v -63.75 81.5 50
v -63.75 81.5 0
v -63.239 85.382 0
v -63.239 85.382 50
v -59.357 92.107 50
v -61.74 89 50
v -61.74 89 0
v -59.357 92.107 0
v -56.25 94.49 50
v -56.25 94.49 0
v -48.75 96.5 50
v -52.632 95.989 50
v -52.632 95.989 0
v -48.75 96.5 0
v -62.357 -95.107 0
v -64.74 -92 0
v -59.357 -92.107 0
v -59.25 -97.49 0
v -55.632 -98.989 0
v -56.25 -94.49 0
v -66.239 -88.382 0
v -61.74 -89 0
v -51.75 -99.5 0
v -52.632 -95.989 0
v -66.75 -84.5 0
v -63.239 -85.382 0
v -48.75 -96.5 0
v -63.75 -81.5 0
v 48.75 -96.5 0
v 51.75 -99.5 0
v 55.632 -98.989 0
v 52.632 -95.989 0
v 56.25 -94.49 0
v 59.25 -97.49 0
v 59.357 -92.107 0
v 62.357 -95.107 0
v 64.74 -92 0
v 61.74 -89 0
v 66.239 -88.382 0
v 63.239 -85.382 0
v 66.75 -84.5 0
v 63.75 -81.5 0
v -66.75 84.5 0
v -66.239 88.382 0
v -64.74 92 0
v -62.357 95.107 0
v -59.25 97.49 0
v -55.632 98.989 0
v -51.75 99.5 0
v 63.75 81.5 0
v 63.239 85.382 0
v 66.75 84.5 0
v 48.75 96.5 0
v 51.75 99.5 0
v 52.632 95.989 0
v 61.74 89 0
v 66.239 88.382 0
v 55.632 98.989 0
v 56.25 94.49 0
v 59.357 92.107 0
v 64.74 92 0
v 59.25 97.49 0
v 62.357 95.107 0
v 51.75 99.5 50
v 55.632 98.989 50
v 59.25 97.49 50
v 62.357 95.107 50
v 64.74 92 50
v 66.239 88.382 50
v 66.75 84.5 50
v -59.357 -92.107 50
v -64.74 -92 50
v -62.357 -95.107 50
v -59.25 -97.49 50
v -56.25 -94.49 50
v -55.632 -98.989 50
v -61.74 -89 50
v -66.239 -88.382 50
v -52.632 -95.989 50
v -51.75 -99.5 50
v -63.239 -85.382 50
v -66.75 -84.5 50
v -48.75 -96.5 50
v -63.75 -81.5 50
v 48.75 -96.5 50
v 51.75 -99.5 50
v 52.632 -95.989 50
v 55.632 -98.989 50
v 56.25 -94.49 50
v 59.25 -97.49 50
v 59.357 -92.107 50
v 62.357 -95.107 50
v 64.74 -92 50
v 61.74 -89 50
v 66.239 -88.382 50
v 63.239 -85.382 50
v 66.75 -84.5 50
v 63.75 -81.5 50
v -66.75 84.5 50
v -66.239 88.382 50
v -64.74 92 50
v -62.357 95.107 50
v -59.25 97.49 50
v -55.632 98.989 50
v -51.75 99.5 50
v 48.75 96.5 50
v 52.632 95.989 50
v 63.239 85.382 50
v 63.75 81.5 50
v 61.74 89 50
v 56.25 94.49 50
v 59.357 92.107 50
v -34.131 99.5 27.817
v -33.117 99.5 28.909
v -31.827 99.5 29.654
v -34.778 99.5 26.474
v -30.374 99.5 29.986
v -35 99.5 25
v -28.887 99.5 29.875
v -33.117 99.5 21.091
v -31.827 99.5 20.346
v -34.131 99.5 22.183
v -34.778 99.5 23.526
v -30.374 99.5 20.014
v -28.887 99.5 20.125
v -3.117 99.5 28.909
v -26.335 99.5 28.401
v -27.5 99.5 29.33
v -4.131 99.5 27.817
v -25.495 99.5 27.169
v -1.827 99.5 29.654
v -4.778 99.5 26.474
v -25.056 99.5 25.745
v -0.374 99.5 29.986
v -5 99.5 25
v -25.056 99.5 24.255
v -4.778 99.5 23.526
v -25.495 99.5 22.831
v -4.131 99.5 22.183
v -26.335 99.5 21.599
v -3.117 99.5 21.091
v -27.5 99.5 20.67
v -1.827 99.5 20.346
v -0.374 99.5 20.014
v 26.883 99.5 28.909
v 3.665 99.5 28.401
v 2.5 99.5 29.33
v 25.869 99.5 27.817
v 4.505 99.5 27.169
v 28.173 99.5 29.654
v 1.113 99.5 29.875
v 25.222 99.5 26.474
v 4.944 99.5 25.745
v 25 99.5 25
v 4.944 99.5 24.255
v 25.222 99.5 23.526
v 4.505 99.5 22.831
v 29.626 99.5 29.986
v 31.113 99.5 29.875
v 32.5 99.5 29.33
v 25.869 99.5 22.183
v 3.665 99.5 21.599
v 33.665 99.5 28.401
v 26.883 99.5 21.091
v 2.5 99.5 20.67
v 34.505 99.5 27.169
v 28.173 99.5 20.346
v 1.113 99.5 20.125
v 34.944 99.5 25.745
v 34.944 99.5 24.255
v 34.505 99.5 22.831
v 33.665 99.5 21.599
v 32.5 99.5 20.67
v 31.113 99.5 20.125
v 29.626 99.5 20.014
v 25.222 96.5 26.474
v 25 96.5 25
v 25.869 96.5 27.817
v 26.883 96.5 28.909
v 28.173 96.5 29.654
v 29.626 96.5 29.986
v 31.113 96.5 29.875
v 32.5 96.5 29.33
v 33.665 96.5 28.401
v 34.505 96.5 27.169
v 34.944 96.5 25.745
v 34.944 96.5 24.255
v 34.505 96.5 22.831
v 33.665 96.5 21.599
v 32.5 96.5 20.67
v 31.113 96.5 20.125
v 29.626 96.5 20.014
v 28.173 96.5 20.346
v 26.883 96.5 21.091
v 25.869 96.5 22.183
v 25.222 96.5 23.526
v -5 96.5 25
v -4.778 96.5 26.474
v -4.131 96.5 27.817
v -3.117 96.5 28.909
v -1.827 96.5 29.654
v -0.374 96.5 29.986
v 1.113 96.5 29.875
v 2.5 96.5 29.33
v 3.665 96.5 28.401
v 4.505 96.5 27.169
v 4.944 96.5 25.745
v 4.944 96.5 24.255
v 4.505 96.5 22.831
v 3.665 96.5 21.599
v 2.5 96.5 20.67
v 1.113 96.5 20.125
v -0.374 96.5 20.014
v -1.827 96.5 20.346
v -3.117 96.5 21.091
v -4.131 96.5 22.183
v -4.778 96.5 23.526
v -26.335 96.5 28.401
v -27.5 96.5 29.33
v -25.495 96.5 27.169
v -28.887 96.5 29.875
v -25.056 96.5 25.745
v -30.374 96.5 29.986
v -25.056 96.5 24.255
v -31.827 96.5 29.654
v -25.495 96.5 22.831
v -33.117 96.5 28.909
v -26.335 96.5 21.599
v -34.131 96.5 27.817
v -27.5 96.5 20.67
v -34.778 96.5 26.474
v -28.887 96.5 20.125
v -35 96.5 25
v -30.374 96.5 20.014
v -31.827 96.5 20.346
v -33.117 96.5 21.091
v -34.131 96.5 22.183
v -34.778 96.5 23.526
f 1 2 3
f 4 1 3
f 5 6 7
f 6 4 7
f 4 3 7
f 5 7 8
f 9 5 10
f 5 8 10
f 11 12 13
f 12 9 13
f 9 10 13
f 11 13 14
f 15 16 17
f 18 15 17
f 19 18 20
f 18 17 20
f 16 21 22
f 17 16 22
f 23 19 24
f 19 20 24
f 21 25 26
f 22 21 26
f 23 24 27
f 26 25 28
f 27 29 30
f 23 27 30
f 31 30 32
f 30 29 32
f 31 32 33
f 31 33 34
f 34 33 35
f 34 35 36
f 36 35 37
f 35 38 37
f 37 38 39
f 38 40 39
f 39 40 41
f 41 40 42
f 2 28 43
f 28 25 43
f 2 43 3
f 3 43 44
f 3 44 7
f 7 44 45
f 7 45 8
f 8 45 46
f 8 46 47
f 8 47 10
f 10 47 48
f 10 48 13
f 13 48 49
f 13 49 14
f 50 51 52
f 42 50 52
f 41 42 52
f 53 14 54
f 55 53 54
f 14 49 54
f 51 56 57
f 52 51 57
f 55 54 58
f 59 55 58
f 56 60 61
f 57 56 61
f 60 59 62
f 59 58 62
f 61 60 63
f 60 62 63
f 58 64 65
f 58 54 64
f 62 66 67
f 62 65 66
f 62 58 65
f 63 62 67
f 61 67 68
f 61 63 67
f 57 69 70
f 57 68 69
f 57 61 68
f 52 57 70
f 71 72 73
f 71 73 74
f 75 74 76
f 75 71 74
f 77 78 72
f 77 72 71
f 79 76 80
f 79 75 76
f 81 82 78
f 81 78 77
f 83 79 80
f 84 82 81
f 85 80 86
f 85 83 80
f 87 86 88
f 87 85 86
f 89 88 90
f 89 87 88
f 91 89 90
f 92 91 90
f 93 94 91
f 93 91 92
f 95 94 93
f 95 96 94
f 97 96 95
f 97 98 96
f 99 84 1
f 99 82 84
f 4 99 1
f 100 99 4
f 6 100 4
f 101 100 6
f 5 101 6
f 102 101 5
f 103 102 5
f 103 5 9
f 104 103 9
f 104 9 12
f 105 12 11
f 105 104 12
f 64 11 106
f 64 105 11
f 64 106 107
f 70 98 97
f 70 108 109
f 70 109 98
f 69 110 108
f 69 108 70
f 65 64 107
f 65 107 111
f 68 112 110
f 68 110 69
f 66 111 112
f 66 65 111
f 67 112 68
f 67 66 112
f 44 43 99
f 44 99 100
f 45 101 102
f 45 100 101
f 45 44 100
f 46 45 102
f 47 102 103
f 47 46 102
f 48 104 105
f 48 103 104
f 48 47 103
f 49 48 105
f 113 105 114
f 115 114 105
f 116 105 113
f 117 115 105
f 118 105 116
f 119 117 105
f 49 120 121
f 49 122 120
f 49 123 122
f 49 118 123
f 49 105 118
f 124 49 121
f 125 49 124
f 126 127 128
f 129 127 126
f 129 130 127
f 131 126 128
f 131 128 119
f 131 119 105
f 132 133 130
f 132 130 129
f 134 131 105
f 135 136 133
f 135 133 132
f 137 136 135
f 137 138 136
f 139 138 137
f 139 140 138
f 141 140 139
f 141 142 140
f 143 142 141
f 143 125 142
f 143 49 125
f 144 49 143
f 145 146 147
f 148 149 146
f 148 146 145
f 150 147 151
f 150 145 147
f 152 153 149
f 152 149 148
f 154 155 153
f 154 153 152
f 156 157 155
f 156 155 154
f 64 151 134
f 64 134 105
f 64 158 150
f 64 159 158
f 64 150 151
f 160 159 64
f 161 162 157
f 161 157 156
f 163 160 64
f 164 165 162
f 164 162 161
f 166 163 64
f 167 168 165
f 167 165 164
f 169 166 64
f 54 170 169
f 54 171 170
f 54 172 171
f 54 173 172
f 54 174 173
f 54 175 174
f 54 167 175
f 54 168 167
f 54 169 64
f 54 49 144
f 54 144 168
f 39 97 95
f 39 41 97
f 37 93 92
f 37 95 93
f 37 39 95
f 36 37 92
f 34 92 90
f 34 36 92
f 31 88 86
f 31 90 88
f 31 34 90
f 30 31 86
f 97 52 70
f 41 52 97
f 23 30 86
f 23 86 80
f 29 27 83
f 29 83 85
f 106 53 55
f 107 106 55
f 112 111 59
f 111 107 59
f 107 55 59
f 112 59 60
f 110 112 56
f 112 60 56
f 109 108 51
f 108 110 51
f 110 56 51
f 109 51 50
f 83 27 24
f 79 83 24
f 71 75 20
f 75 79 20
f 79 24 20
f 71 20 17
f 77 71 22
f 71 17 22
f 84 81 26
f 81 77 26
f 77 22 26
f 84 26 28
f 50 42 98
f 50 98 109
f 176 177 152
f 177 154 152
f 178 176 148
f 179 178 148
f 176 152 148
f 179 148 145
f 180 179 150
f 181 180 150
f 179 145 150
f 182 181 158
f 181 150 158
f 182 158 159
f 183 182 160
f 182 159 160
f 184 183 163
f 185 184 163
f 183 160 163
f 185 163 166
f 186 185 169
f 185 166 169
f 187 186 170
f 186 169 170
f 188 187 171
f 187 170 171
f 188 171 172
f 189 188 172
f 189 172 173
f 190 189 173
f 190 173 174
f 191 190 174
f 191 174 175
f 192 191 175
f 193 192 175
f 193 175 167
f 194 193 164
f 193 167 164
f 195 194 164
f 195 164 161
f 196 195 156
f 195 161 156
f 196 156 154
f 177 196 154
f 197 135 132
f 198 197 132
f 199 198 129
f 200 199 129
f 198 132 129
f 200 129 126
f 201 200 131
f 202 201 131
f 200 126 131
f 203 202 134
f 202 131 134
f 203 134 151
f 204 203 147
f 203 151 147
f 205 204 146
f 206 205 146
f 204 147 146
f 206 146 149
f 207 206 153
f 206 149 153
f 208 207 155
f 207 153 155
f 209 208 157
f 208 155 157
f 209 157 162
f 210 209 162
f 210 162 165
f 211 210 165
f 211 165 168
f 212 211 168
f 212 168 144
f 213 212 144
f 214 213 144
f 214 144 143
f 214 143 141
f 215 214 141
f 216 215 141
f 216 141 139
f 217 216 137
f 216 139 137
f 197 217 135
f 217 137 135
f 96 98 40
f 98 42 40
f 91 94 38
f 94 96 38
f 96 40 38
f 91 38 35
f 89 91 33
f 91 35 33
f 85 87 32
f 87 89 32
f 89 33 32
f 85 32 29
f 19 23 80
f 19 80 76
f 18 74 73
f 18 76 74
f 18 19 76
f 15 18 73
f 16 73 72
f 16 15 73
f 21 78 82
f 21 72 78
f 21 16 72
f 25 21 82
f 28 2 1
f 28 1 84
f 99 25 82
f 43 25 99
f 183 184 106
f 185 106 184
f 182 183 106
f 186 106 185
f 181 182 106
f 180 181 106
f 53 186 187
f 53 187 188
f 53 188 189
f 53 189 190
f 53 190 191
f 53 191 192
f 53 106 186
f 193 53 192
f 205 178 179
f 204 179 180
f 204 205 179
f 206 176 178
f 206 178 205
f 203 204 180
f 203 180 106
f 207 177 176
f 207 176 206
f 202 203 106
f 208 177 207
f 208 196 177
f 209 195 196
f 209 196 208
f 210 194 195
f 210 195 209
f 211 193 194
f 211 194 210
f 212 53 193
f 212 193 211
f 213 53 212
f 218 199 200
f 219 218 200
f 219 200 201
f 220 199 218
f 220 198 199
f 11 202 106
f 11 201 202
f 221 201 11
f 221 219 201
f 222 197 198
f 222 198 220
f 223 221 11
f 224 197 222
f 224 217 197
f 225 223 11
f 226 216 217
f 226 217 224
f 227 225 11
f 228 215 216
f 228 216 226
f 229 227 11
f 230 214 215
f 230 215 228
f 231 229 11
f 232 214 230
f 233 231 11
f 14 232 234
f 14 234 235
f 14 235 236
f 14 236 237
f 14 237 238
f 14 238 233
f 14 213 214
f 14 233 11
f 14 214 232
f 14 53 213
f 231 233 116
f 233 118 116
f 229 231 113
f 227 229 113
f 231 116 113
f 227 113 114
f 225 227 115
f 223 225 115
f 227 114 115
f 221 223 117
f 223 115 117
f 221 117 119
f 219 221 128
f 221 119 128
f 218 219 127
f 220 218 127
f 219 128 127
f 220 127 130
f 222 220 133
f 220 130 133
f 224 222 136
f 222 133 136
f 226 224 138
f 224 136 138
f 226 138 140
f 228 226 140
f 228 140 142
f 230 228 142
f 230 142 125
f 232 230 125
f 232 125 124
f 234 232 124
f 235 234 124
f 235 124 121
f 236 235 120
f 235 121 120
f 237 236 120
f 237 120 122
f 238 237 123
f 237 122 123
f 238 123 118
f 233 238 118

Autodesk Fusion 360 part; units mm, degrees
sketch "Sketch1" plane through (0, 0, 0) normal (0, 0, 1) x (1, 0, 0)
  line L0 (51.75, -99.5) -> (-51.75, -99.5)
  line L1 (-66.75, -84.5) -> (-66.75, 84.5)
  line L2 (-51.75, 99.5) -> (51.75, 99.5)
  line L3 (66.75, 84.5) -> (66.75, -84.5)
  line L4 (66.75, -99.5) -> (-66.75, 99.5) construction
  line L5 (-66.75, -99.5) -> (66.75, 99.5) construction
  line L6 (48.75, 96.5) -> (-48.75, 96.5)
  line L7 (-63.75, 81.5) -> (-63.75, -81.5)
  line L8 (-48.75, -96.5) -> (48.75, -96.5)
  line L9 (63.75, -81.5) -> (63.75, 81.5)
  line L10 (63.75, 96.5) -> (-63.75, -96.5) construction
  line L11 (-63.75, 96.5) -> (63.75, -96.5) construction
  arc A0 (-63.75, -81.5) -> (-48.75, -96.5) centre (-48.75, -81.5) ccw
  arc A1 (-66.75, -84.5) -> (-51.75, -99.5) centre (-51.75, -84.5) ccw
  arc A2 (48.75, -96.5) -> (63.75, -81.5) centre (48.75, -81.5) ccw
  arc A3 (51.75, -99.5) -> (66.75, -84.5) centre (51.75, -84.5) ccw
  arc A4 (63.75, 81.5) -> (48.75, 96.5) centre (48.75, 81.5) ccw
  arc A5 (66.75, 84.5) -> (51.75, 99.5) centre (51.75, 84.5) ccw
  arc A6 (-51.75, 99.5) -> (-66.75, 84.5) centre (-51.75, 84.5) ccw
  arc A7 (-48.75, 96.5) -> (-63.75, 81.5) centre (-48.75, 81.5) ccw
  dimension "d1" = 133.5
  dimension "d2" = 199
  dimension "d3" = 127.5
  dimension "d4" = 193
  dimension "d5" = 15
  dimension "d6" = 15
  dimension "d7" = 15
  dimension "d8" = 15
  dimension "d9" = 15
  dimension "d10" = 15
  dimension "d11" = 15
  dimension "d12" = 15
extrude "Extrude1" add sketch "Sketch1" along normal blind 10
extrude "Extrude2" add 1 faces at (65.75, -27.1667, 10) along direction (0, 0, 1) blind 10
extrude "Extrude3" add 1 faces at (65.75, -27.1667, 20) along direction (0, 0, 1) blind 30
sketch "Sketch2" plane through (0, 99.5, 0) normal (0, 1, 0) x (-1, 0, 0)
  line L0 (-51.75, 0) -> (51.75, 0)
  line L1 (51.75, 0) -> (51.75, 50)
  line L2 (51.75, 50) -> (-51.75, 50)
  line L3 (-51.75, 50) -> (-51.75, 0)
  circle A0 centre (0, 25) radius 5
  circle A1 centre (30, 25) radius 5
  circle A2 centre (-30, 25) radius 5
  dimension "d19" = 10
  dimension "d20" = 10
  dimension "d21" = 10
extrude "Extrude4" cut sketch "Sketch2" against normal blind 10 contours A0 | A1 | A2
